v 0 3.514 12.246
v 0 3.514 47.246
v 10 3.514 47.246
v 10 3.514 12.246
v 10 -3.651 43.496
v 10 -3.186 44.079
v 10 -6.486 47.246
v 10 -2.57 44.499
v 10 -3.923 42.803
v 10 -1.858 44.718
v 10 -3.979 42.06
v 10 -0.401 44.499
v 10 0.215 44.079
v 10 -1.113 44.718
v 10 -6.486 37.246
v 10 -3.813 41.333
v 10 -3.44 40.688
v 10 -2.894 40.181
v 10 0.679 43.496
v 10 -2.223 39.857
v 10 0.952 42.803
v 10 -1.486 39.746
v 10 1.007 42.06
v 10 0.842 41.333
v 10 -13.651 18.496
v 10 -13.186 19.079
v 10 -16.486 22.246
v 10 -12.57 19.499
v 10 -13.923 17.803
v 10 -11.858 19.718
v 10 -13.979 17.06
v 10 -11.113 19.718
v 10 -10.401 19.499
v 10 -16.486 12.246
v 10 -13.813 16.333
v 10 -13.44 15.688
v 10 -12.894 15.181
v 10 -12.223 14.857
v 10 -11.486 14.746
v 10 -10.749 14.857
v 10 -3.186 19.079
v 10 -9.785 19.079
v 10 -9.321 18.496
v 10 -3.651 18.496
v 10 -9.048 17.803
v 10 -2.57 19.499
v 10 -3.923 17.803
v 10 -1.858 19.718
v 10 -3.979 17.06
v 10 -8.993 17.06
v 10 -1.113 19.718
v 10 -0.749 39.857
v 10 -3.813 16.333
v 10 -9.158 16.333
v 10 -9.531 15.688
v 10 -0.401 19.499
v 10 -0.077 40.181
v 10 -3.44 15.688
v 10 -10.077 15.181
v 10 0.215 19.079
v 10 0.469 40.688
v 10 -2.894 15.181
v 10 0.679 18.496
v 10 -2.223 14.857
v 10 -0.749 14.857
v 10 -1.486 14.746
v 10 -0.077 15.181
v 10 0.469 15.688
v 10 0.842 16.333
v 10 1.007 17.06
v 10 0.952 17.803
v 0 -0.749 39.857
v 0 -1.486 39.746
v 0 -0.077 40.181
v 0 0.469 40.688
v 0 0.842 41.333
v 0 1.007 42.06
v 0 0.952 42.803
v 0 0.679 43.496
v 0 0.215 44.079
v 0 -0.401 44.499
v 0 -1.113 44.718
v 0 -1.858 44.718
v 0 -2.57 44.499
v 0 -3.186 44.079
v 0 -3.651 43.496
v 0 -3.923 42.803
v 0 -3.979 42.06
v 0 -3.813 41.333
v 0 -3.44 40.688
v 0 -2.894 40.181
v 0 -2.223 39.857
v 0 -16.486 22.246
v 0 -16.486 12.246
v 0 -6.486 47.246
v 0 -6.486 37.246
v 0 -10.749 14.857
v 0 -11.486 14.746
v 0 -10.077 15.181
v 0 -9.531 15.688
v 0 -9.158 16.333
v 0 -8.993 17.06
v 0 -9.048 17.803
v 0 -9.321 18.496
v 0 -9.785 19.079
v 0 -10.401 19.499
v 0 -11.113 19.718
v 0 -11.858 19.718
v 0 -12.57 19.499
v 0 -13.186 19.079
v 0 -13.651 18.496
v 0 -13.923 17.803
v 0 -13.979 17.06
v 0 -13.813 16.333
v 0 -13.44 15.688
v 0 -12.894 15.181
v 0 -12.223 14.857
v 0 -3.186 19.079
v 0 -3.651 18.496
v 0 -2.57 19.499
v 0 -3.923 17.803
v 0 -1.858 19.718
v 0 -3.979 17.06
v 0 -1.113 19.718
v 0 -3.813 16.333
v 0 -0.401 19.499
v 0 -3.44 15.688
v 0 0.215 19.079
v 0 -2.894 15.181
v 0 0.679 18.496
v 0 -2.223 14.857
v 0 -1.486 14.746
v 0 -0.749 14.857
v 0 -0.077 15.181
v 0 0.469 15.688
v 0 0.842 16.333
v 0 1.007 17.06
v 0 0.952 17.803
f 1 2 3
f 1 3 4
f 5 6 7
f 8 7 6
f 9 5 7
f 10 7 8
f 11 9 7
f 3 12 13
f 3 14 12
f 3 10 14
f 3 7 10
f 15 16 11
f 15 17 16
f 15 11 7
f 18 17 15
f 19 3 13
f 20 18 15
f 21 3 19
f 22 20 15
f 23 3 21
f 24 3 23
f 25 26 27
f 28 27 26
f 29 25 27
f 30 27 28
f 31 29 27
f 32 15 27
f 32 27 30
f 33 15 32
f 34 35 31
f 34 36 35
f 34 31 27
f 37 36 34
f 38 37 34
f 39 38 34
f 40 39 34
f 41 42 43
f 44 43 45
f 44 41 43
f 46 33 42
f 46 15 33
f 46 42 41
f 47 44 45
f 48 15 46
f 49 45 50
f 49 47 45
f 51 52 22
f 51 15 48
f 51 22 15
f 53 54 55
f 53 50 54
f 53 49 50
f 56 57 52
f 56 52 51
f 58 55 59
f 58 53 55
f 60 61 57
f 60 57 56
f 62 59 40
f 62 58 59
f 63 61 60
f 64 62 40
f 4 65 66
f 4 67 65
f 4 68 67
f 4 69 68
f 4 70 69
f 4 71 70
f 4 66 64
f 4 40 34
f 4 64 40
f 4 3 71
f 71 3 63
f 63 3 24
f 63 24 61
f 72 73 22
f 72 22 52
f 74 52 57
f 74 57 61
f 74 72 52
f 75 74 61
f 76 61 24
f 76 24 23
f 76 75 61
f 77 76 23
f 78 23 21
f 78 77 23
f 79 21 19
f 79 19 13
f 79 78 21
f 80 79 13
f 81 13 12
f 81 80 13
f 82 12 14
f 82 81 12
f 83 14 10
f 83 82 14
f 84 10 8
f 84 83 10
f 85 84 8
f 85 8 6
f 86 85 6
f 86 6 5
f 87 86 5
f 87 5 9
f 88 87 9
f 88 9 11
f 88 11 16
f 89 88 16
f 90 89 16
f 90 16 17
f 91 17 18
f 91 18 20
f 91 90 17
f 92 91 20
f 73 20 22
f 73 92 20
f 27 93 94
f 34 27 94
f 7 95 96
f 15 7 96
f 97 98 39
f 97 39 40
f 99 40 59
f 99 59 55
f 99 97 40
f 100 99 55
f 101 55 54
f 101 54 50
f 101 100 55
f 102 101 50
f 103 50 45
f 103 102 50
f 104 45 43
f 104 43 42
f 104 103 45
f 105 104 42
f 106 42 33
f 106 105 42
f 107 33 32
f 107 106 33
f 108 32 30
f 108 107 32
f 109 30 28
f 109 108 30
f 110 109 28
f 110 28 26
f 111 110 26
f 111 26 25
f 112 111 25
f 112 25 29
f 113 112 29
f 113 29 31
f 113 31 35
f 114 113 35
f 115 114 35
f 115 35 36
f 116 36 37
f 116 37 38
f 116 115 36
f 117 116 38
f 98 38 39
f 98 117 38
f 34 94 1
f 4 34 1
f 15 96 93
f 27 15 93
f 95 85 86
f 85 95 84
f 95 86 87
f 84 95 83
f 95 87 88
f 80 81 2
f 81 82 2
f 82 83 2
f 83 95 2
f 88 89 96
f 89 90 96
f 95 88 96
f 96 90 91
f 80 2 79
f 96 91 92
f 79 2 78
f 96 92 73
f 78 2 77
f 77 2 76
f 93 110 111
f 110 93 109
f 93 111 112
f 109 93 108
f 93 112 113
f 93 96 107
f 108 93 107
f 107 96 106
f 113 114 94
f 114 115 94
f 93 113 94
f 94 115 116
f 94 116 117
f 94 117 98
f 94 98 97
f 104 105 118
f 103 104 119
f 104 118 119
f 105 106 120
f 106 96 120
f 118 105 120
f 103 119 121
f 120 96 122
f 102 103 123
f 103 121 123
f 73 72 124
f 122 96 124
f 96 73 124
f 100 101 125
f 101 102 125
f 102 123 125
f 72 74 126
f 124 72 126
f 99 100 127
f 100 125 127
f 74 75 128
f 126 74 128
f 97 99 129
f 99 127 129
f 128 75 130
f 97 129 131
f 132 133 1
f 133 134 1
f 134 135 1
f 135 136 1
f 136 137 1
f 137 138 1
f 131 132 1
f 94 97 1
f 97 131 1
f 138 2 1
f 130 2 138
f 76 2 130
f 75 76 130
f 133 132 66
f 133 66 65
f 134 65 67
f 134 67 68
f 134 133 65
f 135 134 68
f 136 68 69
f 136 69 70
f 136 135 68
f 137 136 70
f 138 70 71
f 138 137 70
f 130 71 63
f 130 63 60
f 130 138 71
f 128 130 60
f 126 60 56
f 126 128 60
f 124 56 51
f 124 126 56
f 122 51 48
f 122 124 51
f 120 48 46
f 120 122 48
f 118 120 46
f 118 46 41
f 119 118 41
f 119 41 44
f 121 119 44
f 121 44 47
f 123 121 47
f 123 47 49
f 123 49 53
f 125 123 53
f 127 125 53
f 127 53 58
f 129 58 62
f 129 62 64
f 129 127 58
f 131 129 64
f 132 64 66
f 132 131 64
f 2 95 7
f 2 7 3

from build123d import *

# Parameters (mm, degrees)
ESQUISSE2_W        = 10
ESQUISSE2_H        = 10
ESQUISSE2_R        = 2.5
ESQUISSE2_H_2      = 20
BOSS_EXTRU_3_DEPTH = 10


with BuildPart() as part:
    # Esquisse2 → Boss.-Extru.3 (new body)
    # profile 1 of 3: a face of its own
    with BuildSketch(Plane(origin=(0, 0, 0), x_dir=(0, 0, -1), z_dir=(1, 0, 0))):
        Polygon((-22.246371136, 3.5143436), (-37.246371136, 3.5143436), (-37.246371136, -6.4856564), (-22.246371136, -16.4856564), align=None)
    # profile 2 of 3: a face of its own
    with BuildSketch(Plane(origin=(0, 0, 0), x_dir=(0, 0, -1), z_dir=(1, 0, 0))):
        with Locations((-42.246371136, -1.4856564)):
            Rectangle(ESQUISSE2_W, ESQUISSE2_H)
        with Locations((-42.246371136, -1.4856564)):
            Circle(ESQUISSE2_R, mode=Mode.SUBTRACT)
    # profile 3 of 3: a face of its own
    with BuildSketch(Plane(origin=(0, 0, 0), x_dir=(0, 0, -1), z_dir=(1, 0, 0))):
        with Locations((-17.246371136, -6.4856564)):
            Rectangle(ESQUISSE2_W, ESQUISSE2_H_2)
        with Locations((-17.246371136, -11.4856564)):
            Circle(ESQUISSE2_R, mode=Mode.SUBTRACT)
        with Locations((-17.246371136, -1.4856564)):
            Circle(ESQUISSE2_R, mode=Mode.SUBTRACT)
    extrude(amount=BOSS_EXTRU_3_DEPTH)


solid = part.part
